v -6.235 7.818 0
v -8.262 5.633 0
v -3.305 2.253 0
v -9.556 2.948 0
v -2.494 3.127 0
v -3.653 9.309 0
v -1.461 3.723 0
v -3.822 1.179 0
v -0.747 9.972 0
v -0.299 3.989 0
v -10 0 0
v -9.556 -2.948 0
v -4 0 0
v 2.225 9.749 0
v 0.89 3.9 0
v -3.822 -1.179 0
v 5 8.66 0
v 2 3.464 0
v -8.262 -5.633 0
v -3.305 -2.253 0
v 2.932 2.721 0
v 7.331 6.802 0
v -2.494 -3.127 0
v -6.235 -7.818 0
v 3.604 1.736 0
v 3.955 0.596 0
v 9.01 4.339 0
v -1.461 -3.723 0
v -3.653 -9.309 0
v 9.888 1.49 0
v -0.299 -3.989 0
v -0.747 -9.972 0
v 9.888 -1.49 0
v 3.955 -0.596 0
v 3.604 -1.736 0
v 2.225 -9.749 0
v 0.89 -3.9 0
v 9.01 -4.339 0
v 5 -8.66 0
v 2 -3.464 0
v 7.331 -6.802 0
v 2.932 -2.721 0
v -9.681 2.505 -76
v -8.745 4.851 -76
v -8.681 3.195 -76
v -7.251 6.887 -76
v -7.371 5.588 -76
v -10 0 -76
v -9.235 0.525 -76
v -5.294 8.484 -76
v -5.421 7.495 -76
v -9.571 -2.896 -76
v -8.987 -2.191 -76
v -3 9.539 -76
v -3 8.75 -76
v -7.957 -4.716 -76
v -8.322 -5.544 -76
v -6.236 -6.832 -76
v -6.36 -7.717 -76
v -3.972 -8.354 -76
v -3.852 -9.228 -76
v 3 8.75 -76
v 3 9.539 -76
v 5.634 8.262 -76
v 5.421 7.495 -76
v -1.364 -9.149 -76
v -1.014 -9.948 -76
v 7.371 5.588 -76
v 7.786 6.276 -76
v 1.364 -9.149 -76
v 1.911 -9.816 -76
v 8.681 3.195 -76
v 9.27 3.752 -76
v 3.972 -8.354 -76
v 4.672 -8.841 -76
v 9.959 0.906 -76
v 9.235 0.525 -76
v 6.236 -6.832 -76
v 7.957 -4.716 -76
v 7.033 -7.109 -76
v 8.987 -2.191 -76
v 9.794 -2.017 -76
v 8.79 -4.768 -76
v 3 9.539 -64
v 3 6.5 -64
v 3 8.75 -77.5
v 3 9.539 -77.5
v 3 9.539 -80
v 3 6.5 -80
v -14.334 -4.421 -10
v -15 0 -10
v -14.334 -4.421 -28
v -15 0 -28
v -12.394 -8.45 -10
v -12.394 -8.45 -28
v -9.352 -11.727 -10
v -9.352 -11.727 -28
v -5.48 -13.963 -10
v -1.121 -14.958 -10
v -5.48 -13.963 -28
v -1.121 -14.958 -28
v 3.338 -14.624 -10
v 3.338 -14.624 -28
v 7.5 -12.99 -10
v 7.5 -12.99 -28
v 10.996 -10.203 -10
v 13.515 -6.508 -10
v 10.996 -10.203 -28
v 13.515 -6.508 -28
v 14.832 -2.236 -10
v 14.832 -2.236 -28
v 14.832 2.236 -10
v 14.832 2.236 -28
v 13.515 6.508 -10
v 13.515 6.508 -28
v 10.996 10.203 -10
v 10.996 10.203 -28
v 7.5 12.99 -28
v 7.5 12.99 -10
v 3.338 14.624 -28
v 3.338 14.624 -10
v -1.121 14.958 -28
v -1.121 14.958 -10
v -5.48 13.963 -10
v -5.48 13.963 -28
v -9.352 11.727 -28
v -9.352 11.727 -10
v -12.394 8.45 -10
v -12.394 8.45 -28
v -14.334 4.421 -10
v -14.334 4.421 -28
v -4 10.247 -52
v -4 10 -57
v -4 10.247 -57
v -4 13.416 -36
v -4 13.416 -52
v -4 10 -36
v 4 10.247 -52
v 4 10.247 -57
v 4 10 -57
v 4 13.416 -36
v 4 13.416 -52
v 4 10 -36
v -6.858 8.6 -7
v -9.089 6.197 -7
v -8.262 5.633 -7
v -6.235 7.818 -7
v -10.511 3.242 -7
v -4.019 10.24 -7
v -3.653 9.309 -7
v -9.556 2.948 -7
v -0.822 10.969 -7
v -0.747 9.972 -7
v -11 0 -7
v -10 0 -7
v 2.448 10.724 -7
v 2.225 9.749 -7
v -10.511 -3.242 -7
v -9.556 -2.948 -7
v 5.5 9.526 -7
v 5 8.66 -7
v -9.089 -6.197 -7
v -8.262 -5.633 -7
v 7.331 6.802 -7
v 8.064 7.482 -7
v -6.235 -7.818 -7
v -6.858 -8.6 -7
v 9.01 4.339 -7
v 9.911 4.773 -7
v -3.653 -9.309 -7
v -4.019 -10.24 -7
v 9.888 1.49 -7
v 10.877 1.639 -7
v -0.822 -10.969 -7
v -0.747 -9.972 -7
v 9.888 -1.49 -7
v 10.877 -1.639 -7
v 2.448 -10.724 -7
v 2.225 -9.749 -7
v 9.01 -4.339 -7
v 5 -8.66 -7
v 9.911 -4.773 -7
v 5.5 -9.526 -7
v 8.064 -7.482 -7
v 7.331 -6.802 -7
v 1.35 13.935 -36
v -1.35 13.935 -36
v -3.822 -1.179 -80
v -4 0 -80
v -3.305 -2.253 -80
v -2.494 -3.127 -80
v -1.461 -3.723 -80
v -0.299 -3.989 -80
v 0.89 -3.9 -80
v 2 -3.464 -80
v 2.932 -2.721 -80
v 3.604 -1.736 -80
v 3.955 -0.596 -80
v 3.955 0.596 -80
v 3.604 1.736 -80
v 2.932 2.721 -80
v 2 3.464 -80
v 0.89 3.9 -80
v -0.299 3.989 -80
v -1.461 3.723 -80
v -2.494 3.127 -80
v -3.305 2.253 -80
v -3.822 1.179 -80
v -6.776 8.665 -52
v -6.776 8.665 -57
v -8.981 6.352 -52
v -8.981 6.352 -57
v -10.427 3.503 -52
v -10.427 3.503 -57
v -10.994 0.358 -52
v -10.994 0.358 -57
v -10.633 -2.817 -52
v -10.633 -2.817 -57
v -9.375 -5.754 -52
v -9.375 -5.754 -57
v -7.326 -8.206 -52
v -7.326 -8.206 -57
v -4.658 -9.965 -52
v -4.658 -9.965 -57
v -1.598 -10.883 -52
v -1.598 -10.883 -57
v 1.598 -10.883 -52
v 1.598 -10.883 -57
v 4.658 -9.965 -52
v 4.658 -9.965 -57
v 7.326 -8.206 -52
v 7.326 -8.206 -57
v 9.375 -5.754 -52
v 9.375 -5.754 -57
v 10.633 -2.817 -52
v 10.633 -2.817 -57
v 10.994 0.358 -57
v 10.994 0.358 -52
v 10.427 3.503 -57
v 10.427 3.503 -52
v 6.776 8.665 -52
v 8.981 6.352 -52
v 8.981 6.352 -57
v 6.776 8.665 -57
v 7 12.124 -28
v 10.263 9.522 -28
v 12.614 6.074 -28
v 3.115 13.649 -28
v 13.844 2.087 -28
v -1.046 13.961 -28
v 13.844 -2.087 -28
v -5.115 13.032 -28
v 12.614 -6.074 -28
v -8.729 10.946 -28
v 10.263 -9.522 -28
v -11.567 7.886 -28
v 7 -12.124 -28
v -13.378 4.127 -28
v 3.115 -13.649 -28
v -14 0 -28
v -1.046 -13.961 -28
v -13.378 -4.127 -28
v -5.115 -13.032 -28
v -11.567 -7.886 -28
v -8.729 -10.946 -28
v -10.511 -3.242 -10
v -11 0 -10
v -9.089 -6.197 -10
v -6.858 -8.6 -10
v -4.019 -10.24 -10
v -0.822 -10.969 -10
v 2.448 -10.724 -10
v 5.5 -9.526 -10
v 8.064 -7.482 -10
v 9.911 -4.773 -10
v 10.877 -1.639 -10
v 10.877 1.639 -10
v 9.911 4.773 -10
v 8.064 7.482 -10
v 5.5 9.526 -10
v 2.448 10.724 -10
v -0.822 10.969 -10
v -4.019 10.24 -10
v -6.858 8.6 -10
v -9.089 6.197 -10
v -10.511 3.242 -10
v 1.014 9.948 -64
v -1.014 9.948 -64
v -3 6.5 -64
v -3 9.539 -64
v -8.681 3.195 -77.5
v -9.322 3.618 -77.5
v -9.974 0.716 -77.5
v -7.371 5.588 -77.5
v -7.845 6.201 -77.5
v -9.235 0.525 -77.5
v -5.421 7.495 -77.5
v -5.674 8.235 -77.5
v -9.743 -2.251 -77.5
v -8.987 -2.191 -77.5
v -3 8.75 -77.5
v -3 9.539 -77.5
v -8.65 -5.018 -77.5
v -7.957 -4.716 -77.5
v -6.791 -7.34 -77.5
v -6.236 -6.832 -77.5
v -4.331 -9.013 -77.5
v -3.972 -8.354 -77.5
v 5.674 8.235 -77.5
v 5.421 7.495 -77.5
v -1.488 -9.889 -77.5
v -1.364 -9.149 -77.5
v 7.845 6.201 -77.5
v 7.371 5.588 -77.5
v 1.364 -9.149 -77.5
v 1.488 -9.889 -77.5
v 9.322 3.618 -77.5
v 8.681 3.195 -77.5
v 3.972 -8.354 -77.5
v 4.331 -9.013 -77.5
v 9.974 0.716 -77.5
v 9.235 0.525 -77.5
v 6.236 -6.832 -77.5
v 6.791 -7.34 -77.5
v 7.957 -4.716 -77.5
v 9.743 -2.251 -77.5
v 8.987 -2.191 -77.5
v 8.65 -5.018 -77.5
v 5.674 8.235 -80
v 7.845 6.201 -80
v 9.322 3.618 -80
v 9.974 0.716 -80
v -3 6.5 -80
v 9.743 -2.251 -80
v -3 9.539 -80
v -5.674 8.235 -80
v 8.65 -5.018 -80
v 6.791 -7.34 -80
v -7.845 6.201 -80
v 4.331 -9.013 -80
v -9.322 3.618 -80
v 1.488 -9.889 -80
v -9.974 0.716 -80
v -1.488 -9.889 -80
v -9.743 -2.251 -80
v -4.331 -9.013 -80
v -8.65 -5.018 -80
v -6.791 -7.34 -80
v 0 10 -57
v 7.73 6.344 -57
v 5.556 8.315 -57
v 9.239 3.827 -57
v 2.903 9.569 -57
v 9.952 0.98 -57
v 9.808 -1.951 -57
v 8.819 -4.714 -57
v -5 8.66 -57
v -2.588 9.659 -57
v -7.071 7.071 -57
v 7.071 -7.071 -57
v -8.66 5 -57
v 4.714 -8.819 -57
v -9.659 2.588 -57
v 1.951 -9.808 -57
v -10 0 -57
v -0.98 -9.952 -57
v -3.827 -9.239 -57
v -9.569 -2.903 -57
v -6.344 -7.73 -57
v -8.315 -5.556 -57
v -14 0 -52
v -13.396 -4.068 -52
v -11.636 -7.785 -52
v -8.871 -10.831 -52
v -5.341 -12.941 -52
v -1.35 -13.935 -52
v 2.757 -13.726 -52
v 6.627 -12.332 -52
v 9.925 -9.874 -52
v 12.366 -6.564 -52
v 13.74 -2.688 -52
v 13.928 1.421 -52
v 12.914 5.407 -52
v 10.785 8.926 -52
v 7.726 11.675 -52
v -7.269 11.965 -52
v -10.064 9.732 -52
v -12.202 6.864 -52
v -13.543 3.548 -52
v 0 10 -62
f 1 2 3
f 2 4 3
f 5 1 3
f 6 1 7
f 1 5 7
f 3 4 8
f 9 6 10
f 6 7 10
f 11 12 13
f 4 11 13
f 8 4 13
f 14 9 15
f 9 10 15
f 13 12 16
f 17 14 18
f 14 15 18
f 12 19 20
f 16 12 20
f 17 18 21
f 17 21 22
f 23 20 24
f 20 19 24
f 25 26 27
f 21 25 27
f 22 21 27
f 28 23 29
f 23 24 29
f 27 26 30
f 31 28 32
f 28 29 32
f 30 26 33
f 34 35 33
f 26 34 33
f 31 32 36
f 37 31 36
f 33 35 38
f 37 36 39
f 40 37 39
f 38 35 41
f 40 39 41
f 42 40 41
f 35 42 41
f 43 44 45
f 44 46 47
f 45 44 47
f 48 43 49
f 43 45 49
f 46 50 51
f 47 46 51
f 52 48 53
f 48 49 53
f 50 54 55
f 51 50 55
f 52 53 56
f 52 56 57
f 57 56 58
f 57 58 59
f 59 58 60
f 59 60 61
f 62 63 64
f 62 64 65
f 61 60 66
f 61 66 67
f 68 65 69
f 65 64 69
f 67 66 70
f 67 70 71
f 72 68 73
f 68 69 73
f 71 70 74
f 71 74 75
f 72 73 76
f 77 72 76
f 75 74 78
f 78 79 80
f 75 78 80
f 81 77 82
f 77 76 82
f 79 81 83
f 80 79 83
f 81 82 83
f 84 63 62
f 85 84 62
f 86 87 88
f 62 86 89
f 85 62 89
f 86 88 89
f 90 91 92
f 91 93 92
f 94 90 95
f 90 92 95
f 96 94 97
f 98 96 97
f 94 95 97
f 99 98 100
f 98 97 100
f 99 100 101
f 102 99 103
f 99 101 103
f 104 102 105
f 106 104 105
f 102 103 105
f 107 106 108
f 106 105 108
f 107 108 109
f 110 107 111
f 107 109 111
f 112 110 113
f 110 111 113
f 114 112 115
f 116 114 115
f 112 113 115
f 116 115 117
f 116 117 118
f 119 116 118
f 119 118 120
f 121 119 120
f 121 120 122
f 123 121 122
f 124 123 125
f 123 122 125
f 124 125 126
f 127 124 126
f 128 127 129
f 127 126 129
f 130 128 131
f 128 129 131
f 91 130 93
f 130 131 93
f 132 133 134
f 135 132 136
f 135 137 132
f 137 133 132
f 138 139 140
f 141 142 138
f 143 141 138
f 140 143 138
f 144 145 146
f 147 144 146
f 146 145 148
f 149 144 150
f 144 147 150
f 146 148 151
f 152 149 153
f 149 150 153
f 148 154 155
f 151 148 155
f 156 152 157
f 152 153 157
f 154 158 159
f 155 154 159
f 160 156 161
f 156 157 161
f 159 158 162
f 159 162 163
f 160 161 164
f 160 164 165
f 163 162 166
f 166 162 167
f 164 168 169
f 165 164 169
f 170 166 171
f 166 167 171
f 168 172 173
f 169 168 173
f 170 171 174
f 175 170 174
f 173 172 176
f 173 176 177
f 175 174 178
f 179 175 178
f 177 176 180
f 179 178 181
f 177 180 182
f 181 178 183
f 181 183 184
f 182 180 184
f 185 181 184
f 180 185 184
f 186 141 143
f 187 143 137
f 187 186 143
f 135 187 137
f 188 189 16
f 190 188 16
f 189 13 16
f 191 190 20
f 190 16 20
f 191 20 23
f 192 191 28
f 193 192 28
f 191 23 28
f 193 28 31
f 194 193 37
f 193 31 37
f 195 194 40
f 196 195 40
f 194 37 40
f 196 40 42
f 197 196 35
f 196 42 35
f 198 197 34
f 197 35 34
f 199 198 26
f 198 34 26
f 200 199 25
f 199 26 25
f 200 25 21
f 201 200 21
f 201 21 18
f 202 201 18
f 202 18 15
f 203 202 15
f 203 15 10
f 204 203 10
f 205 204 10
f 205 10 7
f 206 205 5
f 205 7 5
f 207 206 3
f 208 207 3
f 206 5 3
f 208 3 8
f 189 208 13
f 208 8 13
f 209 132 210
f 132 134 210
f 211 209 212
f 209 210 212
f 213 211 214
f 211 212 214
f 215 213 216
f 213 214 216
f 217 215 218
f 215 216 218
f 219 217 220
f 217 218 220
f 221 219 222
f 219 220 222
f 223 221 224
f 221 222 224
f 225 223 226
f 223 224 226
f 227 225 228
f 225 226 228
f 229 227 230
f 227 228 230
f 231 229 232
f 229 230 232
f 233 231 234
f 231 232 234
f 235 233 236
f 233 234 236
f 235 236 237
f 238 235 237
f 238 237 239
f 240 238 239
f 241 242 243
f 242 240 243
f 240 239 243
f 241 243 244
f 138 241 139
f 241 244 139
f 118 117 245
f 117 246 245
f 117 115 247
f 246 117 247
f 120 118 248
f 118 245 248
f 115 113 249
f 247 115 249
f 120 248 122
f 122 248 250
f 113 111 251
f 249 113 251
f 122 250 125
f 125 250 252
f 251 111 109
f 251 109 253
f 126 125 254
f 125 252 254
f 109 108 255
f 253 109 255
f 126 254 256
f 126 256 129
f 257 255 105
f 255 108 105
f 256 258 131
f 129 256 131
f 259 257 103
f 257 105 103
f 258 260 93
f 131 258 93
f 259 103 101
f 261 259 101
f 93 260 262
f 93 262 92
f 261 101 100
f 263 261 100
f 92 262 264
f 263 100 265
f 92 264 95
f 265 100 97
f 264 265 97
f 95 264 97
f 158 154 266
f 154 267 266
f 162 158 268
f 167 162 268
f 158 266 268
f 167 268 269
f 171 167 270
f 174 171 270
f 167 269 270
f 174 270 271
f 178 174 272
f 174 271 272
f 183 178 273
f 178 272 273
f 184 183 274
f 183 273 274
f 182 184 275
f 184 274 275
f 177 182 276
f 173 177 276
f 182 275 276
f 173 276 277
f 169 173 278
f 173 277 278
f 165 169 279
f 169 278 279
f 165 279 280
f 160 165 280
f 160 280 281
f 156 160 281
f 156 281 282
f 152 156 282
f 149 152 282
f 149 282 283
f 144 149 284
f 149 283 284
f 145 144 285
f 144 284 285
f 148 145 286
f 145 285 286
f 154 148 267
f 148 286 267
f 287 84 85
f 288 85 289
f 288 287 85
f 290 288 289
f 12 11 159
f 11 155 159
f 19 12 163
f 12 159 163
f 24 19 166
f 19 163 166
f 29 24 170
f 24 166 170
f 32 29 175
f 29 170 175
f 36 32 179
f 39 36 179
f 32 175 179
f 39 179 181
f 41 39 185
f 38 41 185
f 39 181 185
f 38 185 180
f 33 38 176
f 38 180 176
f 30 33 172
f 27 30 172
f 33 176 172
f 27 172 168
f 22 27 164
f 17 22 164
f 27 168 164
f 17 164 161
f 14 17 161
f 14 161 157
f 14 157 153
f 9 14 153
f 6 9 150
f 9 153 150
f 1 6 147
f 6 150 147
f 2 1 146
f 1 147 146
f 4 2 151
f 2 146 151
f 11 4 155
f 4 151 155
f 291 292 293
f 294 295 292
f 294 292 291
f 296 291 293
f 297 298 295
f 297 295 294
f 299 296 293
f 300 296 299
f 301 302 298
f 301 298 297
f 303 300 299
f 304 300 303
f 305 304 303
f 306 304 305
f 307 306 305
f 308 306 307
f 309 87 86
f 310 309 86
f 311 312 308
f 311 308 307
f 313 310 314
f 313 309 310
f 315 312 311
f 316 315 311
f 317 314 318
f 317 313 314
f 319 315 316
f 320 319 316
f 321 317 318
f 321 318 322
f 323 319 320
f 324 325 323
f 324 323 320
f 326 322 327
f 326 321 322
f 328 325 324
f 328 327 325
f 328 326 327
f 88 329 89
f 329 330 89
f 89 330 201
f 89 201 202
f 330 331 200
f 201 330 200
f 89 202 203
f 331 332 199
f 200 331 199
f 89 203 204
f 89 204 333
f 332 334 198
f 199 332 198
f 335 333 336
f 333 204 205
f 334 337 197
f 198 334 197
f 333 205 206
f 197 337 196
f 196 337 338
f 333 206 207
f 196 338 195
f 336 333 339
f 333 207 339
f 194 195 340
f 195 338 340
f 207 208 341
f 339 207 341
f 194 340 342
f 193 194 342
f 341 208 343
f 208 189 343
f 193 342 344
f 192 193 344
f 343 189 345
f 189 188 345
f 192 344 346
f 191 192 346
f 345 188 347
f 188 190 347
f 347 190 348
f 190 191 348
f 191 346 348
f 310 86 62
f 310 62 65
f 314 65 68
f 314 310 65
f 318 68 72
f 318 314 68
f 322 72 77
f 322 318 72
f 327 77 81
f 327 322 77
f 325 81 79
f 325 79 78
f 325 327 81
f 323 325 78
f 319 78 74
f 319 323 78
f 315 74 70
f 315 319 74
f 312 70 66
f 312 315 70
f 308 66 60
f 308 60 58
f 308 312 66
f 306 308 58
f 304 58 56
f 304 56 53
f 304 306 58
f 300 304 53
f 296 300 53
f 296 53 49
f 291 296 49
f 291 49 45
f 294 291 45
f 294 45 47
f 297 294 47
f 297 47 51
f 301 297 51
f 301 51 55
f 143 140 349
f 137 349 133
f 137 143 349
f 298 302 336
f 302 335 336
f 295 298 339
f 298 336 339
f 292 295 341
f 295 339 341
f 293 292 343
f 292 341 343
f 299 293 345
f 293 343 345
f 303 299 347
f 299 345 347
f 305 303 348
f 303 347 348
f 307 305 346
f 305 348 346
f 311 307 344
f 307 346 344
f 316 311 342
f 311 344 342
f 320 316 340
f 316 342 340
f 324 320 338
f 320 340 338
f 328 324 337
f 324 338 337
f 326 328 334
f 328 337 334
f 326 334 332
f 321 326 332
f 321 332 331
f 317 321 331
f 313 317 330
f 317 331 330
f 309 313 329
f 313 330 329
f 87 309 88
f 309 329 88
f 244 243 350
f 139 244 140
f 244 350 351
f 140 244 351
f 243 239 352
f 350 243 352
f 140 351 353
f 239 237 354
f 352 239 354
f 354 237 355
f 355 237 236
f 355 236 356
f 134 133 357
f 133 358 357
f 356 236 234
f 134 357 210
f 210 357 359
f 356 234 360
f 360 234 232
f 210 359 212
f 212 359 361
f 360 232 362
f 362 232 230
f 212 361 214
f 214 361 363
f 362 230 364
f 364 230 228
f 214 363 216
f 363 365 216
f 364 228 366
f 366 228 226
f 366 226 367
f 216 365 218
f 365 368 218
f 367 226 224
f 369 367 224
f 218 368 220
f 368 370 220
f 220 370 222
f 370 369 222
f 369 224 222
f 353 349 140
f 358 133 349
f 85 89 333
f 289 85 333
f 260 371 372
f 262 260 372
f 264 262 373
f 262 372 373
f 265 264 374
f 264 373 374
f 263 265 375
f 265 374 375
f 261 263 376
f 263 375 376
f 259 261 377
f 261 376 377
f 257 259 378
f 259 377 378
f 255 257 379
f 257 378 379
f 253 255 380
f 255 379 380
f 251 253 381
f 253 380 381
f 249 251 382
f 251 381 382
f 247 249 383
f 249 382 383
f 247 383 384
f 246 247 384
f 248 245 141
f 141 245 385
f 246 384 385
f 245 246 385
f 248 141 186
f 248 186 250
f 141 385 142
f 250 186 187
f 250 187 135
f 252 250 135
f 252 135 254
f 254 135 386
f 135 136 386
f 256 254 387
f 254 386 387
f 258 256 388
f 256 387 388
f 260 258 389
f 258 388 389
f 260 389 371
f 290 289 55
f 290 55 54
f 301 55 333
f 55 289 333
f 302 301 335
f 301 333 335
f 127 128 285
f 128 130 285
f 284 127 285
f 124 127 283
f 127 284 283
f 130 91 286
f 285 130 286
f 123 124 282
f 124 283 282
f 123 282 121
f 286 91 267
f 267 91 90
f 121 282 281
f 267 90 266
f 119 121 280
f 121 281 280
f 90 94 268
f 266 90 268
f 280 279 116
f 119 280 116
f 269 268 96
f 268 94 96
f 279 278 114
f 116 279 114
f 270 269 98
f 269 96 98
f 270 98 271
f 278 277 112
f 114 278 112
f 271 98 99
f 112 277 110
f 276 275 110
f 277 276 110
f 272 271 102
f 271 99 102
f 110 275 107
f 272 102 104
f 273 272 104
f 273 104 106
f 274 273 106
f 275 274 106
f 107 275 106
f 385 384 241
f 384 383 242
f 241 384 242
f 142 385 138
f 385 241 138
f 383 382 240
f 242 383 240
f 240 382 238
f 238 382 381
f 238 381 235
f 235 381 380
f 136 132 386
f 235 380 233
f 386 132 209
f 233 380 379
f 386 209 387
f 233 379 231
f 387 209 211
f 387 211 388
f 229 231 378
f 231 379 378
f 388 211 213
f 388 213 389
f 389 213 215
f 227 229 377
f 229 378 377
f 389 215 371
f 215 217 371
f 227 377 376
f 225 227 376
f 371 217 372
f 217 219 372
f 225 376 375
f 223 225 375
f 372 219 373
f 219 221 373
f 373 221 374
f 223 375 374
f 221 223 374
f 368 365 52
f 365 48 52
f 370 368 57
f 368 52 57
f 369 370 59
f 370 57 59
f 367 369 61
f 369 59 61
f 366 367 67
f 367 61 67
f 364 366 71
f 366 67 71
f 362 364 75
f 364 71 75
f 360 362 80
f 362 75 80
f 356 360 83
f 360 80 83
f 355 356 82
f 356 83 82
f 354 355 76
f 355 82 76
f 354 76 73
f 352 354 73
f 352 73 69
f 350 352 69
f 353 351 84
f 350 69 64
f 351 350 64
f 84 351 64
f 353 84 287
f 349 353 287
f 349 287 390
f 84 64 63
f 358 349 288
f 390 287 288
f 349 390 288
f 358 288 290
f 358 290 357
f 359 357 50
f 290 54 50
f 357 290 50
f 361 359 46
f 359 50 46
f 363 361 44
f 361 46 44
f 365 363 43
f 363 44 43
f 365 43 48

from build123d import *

# Parameters (mm, degrees)
CUT_EXTRUDE3_DEPTH      = 10
CUT_EXTRUDE3_DEPTH_BACK = 16
CUT_EXTRUDE4_DEPTH      = 16
SKETCH7_W               = 0.75
SKETCH7_H               = 1.5


with BuildPart() as part:
    # Sketch1 → Revolve1 (revolve)
    with BuildSketch(Plane(origin=(0, 0, 0), x_dir=(1, 0, 0), z_dir=(0, 1, 0)), mode=Mode.PRIVATE) as revolve1_sk:
        Polygon((4, 0), (10, 0), (10, 7), (11, 7), (11, 10), (15, 10), (15, 28), (14, 28), (14, 52), (11, 52), (11, 57), (10, 57), (10, 80), (4, 80), align=None)
    revolve(revolve1_sk.sketch.rotate(Axis((0, 0, -122.779357785), (0, 0, 1)), 180), axis=Axis((0, 0, -122.779357785), (0, 0, 1)))

    # Sketch5 → Cut-Extrude3 (cut, two sides: drawn at the far end of the back side and taken through both)
    with BuildSketch(Plane(origin=(0, 0, -52), x_dir=(-1, 0, 0), z_dir=(0, 0, -1)).offset(-CUT_EXTRUDE3_DEPTH_BACK)):
        Polygon((-4, 91.782839275), (-4, 13.416407865), (-4, 10), (4, 10), (4, 13.416407865), (4, 91.782839275), (4, 248.515702096), (-4, 248.515702096), align=None)
    extrude(amount=CUT_EXTRUDE3_DEPTH + CUT_EXTRUDE3_DEPTH_BACK, mode=Mode.SUBTRACT)

    # Sketch6 → Cut-Extrude4 (cut)
    with BuildSketch(Plane(origin=(0, 0, -80), x_dir=(-1, 0, 0), z_dir=(0, 0, -1))):
        Polygon((-3, 80.405860958), (-3, 9.539392014), (-3, 6.5), (3, 6.5), (3, 9.539392014), (3, 80.405860958), (3, 222.138798846), (-3, 222.138798846), align=None)
    extrude(amount=-CUT_EXTRUDE4_DEPTH, mode=Mode.SUBTRACT)

    # Sketch7 → Cut-Revolve1 (revolve, cut)
    with BuildSketch(Plane(origin=(0, 0, 0), x_dir=(1, 0, 0), z_dir=(0, 1, 0)), mode=Mode.PRIVATE) as cut_revolve1_sk:
        with Locations((9.625, 76.75)):
            Rectangle(SKETCH7_W, SKETCH7_H)
    revolve(cut_revolve1_sk.sketch.rotate(Axis((0, 0, 11.784239999), (0, 0, -1)), 252.542396876), axis=Axis((0, 0, 11.784239999), (0, 0, -1)), mode=Mode.SUBTRACT)


solid = part.part
